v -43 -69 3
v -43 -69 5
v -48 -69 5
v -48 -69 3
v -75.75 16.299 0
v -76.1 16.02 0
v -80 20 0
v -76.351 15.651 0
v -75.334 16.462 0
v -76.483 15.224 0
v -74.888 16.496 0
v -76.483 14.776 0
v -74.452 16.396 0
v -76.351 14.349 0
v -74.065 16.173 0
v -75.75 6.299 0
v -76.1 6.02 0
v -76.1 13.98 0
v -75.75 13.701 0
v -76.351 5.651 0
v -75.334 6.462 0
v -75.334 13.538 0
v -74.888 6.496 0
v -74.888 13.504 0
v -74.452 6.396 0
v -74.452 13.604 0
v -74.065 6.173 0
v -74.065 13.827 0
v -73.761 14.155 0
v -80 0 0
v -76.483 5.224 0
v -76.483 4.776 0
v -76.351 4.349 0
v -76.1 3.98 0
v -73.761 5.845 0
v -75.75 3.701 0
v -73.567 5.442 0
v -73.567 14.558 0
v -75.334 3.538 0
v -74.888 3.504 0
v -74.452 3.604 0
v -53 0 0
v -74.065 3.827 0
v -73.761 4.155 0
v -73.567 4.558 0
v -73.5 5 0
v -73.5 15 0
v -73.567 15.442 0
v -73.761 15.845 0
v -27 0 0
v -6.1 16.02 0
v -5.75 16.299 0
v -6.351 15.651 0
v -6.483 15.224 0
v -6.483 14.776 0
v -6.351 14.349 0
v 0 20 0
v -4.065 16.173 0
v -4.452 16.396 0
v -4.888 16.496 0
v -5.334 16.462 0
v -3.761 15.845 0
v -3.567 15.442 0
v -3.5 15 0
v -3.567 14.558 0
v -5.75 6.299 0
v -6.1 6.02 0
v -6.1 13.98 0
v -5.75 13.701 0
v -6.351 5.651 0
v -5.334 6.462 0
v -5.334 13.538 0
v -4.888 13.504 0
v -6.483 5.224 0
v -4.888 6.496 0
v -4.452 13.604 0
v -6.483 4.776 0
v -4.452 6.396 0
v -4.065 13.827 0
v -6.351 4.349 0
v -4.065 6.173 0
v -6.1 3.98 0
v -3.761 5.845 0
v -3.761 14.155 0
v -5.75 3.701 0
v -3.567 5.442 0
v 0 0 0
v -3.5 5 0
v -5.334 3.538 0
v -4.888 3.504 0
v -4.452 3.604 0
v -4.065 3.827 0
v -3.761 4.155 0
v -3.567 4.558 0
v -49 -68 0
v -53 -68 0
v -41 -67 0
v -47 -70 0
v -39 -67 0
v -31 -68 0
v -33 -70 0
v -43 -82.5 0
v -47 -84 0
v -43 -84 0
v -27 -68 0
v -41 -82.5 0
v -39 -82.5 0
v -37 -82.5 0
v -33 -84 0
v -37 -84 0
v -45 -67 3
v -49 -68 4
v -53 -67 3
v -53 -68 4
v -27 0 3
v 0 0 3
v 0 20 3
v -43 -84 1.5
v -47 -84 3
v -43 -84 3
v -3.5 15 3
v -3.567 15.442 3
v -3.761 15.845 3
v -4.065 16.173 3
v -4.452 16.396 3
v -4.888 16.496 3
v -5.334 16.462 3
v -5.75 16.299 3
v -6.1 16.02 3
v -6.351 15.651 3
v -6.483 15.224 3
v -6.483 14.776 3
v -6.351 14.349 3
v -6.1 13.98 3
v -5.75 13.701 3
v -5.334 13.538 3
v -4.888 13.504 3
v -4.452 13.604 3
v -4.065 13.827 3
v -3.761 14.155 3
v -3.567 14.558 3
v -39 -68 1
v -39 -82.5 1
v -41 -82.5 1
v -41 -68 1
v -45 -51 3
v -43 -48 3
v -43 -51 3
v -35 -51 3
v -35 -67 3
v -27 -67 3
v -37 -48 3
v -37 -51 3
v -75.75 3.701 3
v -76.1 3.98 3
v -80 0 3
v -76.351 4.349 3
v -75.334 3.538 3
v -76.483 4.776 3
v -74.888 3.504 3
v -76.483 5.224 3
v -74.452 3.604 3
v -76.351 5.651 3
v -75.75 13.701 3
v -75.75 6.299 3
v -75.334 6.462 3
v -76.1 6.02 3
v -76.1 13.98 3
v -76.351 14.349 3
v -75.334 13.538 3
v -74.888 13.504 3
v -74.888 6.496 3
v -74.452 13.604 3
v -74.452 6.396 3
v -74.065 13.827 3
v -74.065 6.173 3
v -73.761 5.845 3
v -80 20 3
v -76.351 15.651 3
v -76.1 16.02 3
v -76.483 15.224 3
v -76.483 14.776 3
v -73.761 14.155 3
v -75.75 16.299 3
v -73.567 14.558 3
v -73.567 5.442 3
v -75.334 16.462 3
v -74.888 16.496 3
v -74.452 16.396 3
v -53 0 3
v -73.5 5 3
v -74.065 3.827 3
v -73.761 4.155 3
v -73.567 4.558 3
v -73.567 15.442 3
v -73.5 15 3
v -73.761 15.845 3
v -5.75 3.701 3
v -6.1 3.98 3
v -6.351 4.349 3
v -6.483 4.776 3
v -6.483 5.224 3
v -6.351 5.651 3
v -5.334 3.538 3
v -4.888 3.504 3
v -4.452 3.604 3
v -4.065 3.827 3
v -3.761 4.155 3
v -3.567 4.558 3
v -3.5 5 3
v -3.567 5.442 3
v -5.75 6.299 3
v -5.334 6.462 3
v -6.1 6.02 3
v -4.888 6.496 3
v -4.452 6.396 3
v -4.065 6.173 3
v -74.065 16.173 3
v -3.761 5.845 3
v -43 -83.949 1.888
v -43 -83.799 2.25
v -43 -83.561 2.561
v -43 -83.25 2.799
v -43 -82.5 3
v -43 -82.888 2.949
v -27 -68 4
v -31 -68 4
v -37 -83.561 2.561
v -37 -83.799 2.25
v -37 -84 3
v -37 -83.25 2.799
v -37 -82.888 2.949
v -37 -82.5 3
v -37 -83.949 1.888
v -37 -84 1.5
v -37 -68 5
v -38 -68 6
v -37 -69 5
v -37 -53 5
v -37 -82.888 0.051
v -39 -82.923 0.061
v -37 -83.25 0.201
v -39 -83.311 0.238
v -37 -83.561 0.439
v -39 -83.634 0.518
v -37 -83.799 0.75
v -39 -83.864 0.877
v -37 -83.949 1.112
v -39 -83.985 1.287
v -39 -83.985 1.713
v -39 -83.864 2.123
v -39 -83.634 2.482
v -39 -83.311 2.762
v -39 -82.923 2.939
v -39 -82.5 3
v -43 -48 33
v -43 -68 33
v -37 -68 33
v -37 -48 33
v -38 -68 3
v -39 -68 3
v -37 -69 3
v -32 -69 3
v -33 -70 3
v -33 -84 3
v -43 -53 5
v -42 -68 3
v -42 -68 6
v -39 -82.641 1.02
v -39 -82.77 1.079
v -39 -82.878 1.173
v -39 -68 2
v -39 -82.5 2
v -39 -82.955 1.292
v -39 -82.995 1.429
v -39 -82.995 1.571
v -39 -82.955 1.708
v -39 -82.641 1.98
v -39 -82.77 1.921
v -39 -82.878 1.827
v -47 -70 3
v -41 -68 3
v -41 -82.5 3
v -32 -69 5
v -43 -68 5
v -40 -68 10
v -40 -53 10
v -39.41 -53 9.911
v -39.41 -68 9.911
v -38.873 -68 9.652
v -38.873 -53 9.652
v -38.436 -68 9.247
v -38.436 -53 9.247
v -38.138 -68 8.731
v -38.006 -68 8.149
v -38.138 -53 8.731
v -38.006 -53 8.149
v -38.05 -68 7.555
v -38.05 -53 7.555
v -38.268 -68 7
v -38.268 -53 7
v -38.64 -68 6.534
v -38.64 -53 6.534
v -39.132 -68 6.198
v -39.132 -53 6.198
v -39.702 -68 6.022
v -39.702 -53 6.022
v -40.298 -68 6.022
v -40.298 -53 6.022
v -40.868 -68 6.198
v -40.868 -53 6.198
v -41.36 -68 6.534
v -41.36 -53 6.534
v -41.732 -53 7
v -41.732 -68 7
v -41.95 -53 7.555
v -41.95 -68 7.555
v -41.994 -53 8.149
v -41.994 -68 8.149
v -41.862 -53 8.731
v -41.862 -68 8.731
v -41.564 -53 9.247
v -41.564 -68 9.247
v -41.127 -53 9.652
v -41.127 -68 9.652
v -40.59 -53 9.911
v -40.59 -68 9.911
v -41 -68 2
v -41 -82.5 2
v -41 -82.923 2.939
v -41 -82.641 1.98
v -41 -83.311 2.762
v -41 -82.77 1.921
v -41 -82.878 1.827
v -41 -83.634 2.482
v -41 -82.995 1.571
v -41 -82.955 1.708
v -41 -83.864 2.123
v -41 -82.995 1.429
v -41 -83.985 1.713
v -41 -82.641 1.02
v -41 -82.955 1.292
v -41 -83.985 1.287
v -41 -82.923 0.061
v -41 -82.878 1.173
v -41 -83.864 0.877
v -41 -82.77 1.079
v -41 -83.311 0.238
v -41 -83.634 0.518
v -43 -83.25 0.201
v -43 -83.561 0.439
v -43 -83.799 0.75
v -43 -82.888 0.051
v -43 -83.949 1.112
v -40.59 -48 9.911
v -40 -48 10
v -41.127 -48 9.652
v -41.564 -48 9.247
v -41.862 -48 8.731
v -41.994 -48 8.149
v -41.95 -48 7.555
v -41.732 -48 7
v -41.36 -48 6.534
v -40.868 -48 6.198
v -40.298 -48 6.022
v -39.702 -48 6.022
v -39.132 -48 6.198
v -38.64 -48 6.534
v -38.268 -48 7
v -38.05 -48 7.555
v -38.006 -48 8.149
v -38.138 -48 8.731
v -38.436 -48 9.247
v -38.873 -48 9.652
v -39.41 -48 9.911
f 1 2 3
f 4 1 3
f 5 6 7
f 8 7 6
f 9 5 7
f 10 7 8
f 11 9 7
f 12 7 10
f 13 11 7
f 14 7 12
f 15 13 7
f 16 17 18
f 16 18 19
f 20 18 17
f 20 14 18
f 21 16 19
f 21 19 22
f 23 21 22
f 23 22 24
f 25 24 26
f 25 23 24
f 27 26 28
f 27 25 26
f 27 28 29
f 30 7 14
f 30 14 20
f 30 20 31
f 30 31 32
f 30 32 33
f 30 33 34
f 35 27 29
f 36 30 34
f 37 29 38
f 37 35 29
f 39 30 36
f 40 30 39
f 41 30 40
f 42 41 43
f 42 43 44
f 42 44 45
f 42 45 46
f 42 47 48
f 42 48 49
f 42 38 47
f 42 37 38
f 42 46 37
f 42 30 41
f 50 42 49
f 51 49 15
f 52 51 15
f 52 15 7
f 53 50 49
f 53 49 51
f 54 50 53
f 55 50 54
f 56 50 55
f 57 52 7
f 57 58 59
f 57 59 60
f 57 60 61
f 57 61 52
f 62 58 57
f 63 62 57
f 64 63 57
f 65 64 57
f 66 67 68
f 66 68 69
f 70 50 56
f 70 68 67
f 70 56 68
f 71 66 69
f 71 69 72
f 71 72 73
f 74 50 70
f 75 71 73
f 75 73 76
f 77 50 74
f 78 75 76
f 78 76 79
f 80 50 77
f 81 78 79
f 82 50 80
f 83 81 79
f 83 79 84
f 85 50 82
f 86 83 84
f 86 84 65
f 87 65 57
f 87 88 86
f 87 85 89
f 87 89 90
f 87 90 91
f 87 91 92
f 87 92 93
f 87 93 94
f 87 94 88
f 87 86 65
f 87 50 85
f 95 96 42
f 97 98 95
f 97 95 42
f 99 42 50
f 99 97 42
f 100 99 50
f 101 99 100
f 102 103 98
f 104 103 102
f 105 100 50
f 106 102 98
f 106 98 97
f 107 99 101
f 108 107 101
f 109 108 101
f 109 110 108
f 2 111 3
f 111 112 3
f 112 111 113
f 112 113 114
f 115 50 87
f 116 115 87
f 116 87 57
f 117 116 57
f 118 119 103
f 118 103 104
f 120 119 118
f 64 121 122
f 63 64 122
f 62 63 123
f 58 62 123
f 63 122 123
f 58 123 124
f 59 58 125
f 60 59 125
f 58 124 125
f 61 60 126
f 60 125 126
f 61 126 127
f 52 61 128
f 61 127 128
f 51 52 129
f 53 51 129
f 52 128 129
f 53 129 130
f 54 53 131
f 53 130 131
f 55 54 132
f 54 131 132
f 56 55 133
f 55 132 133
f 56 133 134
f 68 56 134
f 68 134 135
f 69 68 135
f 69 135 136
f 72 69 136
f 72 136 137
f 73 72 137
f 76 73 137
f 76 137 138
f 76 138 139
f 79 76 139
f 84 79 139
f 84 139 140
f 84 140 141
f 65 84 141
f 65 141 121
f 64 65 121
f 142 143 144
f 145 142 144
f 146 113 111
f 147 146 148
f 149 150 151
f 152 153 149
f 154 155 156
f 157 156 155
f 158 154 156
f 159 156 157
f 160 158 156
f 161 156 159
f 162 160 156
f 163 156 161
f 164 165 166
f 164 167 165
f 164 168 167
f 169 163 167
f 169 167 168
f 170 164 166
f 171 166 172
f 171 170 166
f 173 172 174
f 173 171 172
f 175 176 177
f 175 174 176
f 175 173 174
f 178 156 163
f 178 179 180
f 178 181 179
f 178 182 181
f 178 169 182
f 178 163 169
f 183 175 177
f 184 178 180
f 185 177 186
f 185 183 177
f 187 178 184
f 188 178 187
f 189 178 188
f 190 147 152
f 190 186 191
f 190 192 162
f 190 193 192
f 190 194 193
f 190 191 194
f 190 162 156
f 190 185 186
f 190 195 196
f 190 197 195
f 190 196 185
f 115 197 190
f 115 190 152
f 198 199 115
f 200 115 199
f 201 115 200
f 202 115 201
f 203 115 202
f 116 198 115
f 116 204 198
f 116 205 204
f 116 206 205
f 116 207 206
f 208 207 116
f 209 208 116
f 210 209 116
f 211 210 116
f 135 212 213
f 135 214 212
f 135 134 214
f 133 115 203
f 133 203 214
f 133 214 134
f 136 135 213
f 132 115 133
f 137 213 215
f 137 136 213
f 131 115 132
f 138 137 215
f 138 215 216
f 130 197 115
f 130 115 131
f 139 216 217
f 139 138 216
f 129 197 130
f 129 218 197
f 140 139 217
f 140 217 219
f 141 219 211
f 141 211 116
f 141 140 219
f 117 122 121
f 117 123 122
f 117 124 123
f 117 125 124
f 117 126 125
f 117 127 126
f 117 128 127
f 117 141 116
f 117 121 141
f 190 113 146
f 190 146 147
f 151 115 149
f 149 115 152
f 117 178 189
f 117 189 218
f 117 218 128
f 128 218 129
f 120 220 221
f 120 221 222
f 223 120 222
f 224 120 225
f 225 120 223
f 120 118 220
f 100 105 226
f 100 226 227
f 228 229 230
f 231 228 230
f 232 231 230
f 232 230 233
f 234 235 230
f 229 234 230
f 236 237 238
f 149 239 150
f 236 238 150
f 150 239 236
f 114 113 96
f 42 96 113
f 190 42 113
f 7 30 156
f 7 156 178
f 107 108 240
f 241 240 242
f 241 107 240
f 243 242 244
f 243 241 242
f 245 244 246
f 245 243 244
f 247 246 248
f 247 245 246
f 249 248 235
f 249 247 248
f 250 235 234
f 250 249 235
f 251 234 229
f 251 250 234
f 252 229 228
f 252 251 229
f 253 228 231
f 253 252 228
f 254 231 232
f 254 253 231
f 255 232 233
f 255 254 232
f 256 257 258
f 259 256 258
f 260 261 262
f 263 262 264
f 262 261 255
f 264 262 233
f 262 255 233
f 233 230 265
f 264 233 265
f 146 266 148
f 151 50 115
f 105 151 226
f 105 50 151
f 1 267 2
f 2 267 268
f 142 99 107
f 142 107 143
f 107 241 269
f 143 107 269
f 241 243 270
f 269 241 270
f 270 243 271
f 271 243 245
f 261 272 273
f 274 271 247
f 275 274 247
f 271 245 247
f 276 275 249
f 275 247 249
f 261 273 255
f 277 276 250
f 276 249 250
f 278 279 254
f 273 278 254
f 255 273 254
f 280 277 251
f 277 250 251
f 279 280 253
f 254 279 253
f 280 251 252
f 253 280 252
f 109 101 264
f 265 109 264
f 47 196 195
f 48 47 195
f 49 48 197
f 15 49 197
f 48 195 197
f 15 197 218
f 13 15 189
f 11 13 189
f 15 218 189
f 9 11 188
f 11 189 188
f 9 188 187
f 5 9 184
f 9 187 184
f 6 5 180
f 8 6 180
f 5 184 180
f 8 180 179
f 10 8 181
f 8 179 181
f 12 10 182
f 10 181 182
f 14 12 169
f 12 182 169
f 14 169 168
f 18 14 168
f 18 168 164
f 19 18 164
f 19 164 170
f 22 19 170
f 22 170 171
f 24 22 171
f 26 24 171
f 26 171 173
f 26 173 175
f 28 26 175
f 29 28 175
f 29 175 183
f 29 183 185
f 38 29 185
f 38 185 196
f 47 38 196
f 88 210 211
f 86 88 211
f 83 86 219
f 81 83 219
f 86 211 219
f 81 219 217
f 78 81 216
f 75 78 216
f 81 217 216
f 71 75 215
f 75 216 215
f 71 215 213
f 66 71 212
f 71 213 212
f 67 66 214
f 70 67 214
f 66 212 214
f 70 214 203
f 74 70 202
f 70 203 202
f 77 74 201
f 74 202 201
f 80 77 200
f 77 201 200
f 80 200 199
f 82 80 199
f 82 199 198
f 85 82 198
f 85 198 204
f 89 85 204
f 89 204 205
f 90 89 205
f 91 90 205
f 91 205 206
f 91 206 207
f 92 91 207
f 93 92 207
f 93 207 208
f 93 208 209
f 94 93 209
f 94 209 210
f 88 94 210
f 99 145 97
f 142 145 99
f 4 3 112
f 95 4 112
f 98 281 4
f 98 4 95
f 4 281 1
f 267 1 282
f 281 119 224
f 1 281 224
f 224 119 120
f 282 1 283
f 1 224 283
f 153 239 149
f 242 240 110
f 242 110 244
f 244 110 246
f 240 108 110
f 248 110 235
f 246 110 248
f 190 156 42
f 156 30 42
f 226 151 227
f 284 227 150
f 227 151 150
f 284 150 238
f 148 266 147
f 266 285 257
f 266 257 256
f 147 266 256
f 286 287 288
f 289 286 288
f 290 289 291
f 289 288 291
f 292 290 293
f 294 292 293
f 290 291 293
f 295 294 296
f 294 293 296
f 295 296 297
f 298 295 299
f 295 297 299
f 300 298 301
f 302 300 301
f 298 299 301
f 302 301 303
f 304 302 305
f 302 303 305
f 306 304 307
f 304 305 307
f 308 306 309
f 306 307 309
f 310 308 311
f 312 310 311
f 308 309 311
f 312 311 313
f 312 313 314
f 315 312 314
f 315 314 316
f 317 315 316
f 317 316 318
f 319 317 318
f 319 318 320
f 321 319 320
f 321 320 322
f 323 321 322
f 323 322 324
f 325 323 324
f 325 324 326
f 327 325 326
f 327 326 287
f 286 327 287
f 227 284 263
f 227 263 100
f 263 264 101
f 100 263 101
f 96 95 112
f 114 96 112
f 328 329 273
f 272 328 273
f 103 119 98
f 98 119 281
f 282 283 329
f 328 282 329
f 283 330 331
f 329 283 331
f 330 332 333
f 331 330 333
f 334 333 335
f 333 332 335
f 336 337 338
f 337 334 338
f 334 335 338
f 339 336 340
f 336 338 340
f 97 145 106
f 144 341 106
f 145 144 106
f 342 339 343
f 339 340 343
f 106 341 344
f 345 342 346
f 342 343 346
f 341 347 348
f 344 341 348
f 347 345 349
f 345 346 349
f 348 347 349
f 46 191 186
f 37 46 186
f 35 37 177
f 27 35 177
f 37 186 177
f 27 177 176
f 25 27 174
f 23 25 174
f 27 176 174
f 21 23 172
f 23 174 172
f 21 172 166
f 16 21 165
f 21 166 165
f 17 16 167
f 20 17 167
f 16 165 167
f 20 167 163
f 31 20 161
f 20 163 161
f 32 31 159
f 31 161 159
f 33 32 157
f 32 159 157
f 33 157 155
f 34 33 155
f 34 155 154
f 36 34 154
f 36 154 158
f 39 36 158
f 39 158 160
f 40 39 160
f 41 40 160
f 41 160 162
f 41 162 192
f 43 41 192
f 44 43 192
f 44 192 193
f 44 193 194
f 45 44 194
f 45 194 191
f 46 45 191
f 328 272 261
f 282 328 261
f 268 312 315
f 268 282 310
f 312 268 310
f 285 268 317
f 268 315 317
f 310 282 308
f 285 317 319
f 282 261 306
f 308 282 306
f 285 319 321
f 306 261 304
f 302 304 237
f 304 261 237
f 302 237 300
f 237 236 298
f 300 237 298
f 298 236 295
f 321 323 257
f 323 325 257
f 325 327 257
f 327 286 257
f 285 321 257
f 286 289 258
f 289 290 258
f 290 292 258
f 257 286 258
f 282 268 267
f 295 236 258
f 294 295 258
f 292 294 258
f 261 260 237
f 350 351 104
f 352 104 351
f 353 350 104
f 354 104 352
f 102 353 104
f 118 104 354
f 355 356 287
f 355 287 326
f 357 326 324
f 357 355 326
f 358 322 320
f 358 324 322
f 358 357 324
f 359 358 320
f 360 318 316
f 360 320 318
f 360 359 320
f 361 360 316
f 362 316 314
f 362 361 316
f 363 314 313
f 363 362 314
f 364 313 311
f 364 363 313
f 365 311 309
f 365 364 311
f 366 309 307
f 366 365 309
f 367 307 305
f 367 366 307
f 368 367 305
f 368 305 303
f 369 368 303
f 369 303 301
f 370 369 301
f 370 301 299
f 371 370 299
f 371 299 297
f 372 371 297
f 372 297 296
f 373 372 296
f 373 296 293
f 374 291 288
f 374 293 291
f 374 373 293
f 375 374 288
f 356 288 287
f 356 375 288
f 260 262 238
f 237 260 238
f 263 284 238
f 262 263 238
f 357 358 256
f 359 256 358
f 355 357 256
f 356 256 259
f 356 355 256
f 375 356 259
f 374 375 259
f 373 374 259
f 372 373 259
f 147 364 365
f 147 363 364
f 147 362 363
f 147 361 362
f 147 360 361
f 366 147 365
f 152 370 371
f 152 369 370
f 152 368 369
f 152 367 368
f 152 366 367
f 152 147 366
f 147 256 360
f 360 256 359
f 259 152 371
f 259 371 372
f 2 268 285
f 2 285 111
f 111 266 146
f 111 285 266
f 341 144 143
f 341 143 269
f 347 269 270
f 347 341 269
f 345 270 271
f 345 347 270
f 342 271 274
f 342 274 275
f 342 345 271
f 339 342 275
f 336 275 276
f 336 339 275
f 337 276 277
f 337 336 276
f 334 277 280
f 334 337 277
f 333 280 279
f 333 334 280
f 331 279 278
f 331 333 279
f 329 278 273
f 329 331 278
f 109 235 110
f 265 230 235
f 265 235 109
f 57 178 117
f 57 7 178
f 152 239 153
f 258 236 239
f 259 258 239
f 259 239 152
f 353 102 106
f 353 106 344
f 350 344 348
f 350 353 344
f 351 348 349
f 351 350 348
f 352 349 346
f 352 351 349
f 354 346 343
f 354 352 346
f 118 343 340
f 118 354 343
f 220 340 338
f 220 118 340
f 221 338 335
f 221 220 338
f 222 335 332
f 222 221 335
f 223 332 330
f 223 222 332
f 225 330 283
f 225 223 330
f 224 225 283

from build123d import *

# Parameters (mm, degrees)
SKETCH_1_W           = 80
SKETCH_1_H           = 20
EXTRUDE_1_DEPTH      = 3
SKETCH_2_W           = 6
SKETCH_2_H           = 20
EXTRUDE_2_DEPTH      = 95
SKETCH_3_W           = 6
SKETCH_3_H           = 15
EXTRUDE_3_DEPTH      = 80
CHAMFER_1_SIZE       = 10
CHAMFER_2_SIZE       = 10
FILLET_1_R           = 10
SKETCH_4_W           = 6
SKETCH_4_H           = 15
EXTRUDE_4_DEPTH      = 5
SKETCH_5_W           = 6
SKETCH_5_H           = 15
EXTRUDE_5_DEPTH      = 5
FILLET_2_R           = 2
CHAMFER_3_SIZE       = 3
SKETCH_6_R           = 1.5
CUT_EXTRUDE_1_DEPTH  = 30
SKETCH_7_W           = 26
SKETCH_7_H           = 3
EXTRUDE_6_DEPTH      = 68
CHAMFER_4_SIZE       = 10
SKETCH_8_W           = 6
SKETCH_8_H           = 13
EXTRUDE_7_DEPTH      = 100
CHAMFER_5_SIZE       = 5
CHAMFER_6_SIZE       = 2
SKETCH_9_W           = 99.532664039
SKETCH_9_H           = 104.077347625
CUT_EXTRUDE_3_DEPTH  = 30
SKETCH_14_W          = 15.593287018
SKETCH_14_H          = 53.78968733
CUT_EXTRUDE_5_DEPTH  = 57
SKETCH_15_W          = 6
SKETCH_15_H          = 25
EXTRUDE_8_DEPTH      = 5
SKETCH_16_W          = 6
SKETCH_16_H          = 25
EXTRUDE_9_DEPTH      = 5
CHAMFER_7_SIZE       = 5
SKETCH_17_W          = 6
SKETCH_17_H          = 23
CUT_EXTRUDE_6_DEPTH  = 100
SKETCH_20_W          = 26.699145715
SKETCH_20_H          = 4.006007242
CUT_EXTRUDE_7_DEPTH  = 133
SKETCH_21_W          = 6
SKETCH_21_H          = 15
EXTRUDE_11_DEPTH     = 30
SKETCH_22_R          = 2
CUT_EXTRUDE_8_DEPTH  = 27
EXTRUDE_12_DEPTH     = 3
SKETCH_26_W          = 4
SKETCH_26_H          = 3
EXTRUDE_14_DEPTH     = 16
SKETCH_27_W          = 4
SKETCH_27_H          = 13
EXTRUDE_21_DEPTH     = 6
SKETCH_28_R          = 1.5
CUT_EXTRUDE_9_DEPTH  = 22
CHAMFER_9_SIZE       = 2
CHAMFER_10_SIZE      = 2
CHAMFER_11_SIZE      = 1
SKETCH_29_W          = 6
SKETCH_29_H          = 28
EXTRUDE_22_DEPTH     = 20
SKETCH_30_W          = 6
SKETCH_30_H          = 20
EXTRUDE_23_DEPTH     = 2
CUT_EXTRUDE_START    = -20
SKETCH_31_R          = 2
CUT_EXTRUDE_10_DEPTH = 20
SKETCH_32_R          = 1.5
CUT_EXTRUDE_11_DEPTH = 10
SKETCH_33_W          = 6
SKETCH_33_H          = 30
CUT_EXTRUDE_12_DEPTH = 15
CUT_EXTRUDE_13_DEPTH = 6
EXTRUDE_24_DEPTH     = 2
EXTRUDE_25_REACH     = 136.146
SKETCH_37_W          = 2
SKETCH_37_H          = 3
EXTRUDE_26_DEPTH     = 2
EXTRUDE_27_DEPTH     = 2
EXTRUDE_28_REACH     = 136.146
CHAMFER_12_SIZE      = 1


# Some blends are built 0.0001 mm under size
with BuildPart() as part:
    # 草图1 → 凸台-拉伸1 (new body)
    with BuildSketch(Plane.XY):
        with Locations((-40, 10)):
            Rectangle(SKETCH_1_W, SKETCH_1_H)
    extrude(amount=EXTRUDE_1_DEPTH)

    # 草图2 → 凸台-拉伸2 (add)
    with BuildSketch(Plane.XY.offset(3)):
        with Locations((-40, 10)):
            Rectangle(SKETCH_2_W, SKETCH_2_H)
    extrude(amount=EXTRUDE_2_DEPTH)

    # 草图3 → 凸台-拉伸3 (add)
    with BuildSketch(Plane.XZ):
        with Locations((-40, 90.5)):
            Rectangle(SKETCH_3_W, SKETCH_3_H)
    extrude(amount=EXTRUDE_3_DEPTH)

    # 倒角1
    chamfer_1_edges = [part.edges().sort_by_distance(p)[0] for p in [
        (-43, 10, 3),
        (-37, 10, 3),
    ]]
    chamfer(chamfer_1_edges, length=CHAMFER_1_SIZE)

    # 倒角2
    chamfer_2_edges = [part.edges().sort_by_distance(p)[0] for p in [
        (-40, 0, 83),
    ]]
    chamfer(chamfer_2_edges, length=CHAMFER_2_SIZE)

    # 圆角1
    fillet_1_edges = [part.edges().sort_by_distance(p)[0] for p in [
        (-40, 20, 98),
    ]]
    fillet(fillet_1_edges, radius=FILLET_1_R)

    # 草图4 → 凸台-拉伸4 (add)
    with BuildSketch(Plane(origin=(0, 0, 83), x_dir=(-1, 0, 0), z_dir=(0, 0, -1))):
        with Locations((40, -72.5)):
            Rectangle(SKETCH_4_W, SKETCH_4_H)
    extrude(amount=EXTRUDE_4_DEPTH)

    # 草图5 → 凸台-拉伸5 (add)
    with BuildSketch(Plane.XY.offset(98)):
        with Locations((-40, -72.5)):
            Rectangle(SKETCH_5_W, SKETCH_5_H)
    extrude(amount=EXTRUDE_5_DEPTH)

    # 圆角2
    fillet_2_edges = [part.edges().sort_by_distance(p)[0] for p in [
        (-40, -65, 78),
        (-40, -65, 103),
    ]]
    fillet(fillet_2_edges, radius=FILLET_2_R)

    # 倒角3
    chamfer_3_edges = [part.edges().sort_by_distance(p)[0] for p in [
        (-40, -65, 83),
        (-40, -65, 98),
    ]]
    chamfer(chamfer_3_edges, length=CHAMFER_3_SIZE - 0.0001)  # a hair under: the kernel refuses the full size

    # 草图6 → 切除-拉伸1 (cut)
    with BuildSketch(Plane.XZ):
        with Locations(Location((-40, 8, 0), (0, 0, 270))):
            Circle(SKETCH_6_R)
        with Locations(Location((-40, 23, 0), (0, 0, 270))):
            Circle(SKETCH_6_R)
    extrude(amount=-CUT_EXTRUDE_1_DEPTH, mode=Mode.SUBTRACT)

    # 草图7 → 凸台-拉伸6 (add)
    with BuildSketch(Plane.XZ):
        with Locations((-40, 1.5)):
            Rectangle(SKETCH_7_W, SKETCH_7_H)
    extrude(amount=EXTRUDE_6_DEPTH)

    # 倒角4
    chamfer_4_edges = [part.edges().sort_by_distance(p)[0] for p in [
        (-53, -68, 1.5),
        (-27, -68, 1.5),
    ]]
    chamfer(chamfer_4_edges, length=CHAMFER_4_SIZE)

    # 草图8 → 凸台-拉伸7 (add)
    with BuildSketch(Plane.XY.offset(3)):
        with Locations((-40, -73.5)):
            Rectangle(SKETCH_8_W, SKETCH_8_H)
    extrude(amount=EXTRUDE_7_DEPTH)

    # 倒角5
    chamfer_5_edges = [part.edges().sort_by_distance(p)[0] for p in [
        (-40, -67, 3),
    ]]
    chamfer(chamfer_5_edges, length=CHAMFER_5_SIZE)

    # 倒角6
    # the kernel refuses this chamfer: 2 mm, written as the material it adds along each edge
    with BuildSketch(Plane(origin=(-37, -56.856634024, 3), x_dir=(1, 0, 0), z_dir=(0, -1, 0))) as chamfer_6_piece_1_section:
        Polygon((CHAMFER_6_SIZE, 0), (0, CHAMFER_6_SIZE), (0, 0), align=None)
    chamfer_6_piece_1 = extrude(amount=16.286731952, mode=Mode.PRIVATE)
    chamfer_6_piece_1 = split(chamfer_6_piece_1, bisect_by=Plane(origin=(-37, -59.428317012, 0.428317012), z_dir=(0, -0.7071067811865476, -0.7071067811865476)), keep=Keep.TOP, mode=Mode.PRIVATE)
    chamfer_6_piece_1 = split(chamfer_6_piece_1, bisect_by=Plane(origin=(-31.428317012, -62.428317012, 3), z_dir=(-0.7071067811865475, 0.7071067811865477, -1.922962686383564e-15)), keep=Keep.TOP, mode=Mode.PRIVATE)
    add(chamfer_6_piece_1)
    with BuildSketch(Plane(origin=(-43, -73.143365976, 3), x_dir=(-1, 0, 0), z_dir=(0, 1, 0))) as chamfer_6_piece_2_section:
        Polygon((CHAMFER_6_SIZE, 0), (0, CHAMFER_6_SIZE), (0, 0), align=None)
    chamfer_6_piece_2 = extrude(amount=16.286731952, mode=Mode.PRIVATE)
    chamfer_6_piece_2 = split(chamfer_6_piece_2, bisect_by=Plane(origin=(-43, -67.571682988, 8.571682988), z_dir=(0, -0.7071067811865476, -0.7071067811865476)), keep=Keep.TOP, mode=Mode.PRIVATE)
    chamfer_6_piece_2 = split(chamfer_6_piece_2, bisect_by=Plane(origin=(-40.428317012, -70.571682988, 3), z_dir=(0.7071067811865476, 0.7071067811865476, 3.5574809698095944e-15)), keep=Keep.TOP, mode=Mode.PRIVATE)
    add(chamfer_6_piece_2)

    # 草图9 → 切除-拉伸3 (cut)
    with BuildSketch(Plane(origin=(0, 20, 0), x_dir=(1, 0, 0), z_dir=(0, 1, 0))):
        with Locations((-30.233667981, -55.038673813)):
            Rectangle(SKETCH_9_W, SKETCH_9_H)
    extrude(amount=-CUT_EXTRUDE_3_DEPTH, mode=Mode.SUBTRACT)

    # 草图14 → 切除-拉伸5 (cut)
    with BuildSketch(Plane(origin=(0, -10, 0), x_dir=(1, 0, 0), z_dir=(0, 1, 0))):
        with Locations((-38.927067407, -81.040006974)):
            Rectangle(SKETCH_14_W, SKETCH_14_H)
    extrude(amount=-CUT_EXTRUDE_5_DEPTH, mode=Mode.SUBTRACT)

    # 草图15 → 凸台-拉伸8 (add)
    with BuildSketch(Plane(origin=(0, -67, 0), x_dir=(1, 0, 0), z_dir=(0, 1, 0))):
        with Locations((-40, -90.5)):
            Rectangle(SKETCH_15_W, SKETCH_15_H)
    extrude(amount=EXTRUDE_8_DEPTH)

    # 草图16 → 凸台-拉伸9 (add)
    with BuildSketch(Plane.XZ.offset(80)):
        with Locations((-40, 90.5)):
            Rectangle(SKETCH_16_W, SKETCH_16_H)
    extrude(amount=EXTRUDE_9_DEPTH)

    # 倒角7
    chamfer_7_edges = [part.edges().sort_by_distance(p)[0] for p in [
        (-40, -80, 78),
        (-40, -67, 78),
    ]]
    chamfer(chamfer_7_edges, length=CHAMFER_7_SIZE - 0.0001)  # a hair under: the kernel refuses the full size

    # 草图17 → 切除-拉伸6 (cut)
    with BuildSketch(Plane.XY.offset(103)):
        with Locations((-40, -73.5)):
            Rectangle(SKETCH_17_W, SKETCH_17_H)
    extrude(amount=-CUT_EXTRUDE_6_DEPTH, mode=Mode.SUBTRACT)

    # 草图20 → 切除-拉伸7 (cut)
    with BuildSketch(Plane(origin=(0, 20, 0), x_dir=(1, 0, 0), z_dir=(0, 1, 0))):
        with Locations((-37.936501357, -5.003003621)):
            Rectangle(SKETCH_20_W, SKETCH_20_H)
    extrude(amount=-CUT_EXTRUDE_7_DEPTH, mode=Mode.SUBTRACT)

    # 草图21 → 凸台-拉伸11 (add)
    with BuildSketch(Plane.XY.offset(3)):
        with Locations((-40, -60.5)):
            Rectangle(SKETCH_21_W, SKETCH_21_H)
    extrude(amount=EXTRUDE_11_DEPTH)

    # 草图22 → 切除-拉伸8 (cut)
    with BuildSketch(Plane(origin=(0, -53, 0), x_dir=(1, 0, 0), z_dir=(0, 1, 0))):
        with Locations(Location((-40, -8, 0), (0, 0, 270))):
            Circle(SKETCH_22_R)
    extrude(amount=-CUT_EXTRUDE_8_DEPTH, mode=Mode.SUBTRACT)

    # 草图24 → 凸台-拉伸12 (add)
    with BuildSketch(Plane(origin=(0, 0, 0), x_dir=(-1, 0, 0), z_dir=(0, 0, -1))):
        Polygon((27, -58), (27, -68), (37, -68), align=None)
        Polygon((53, -58), (53, -68), (43, -68), align=None)
    extrude(amount=-EXTRUDE_12_DEPTH)

    # 草图26 → 凸台-拉伸14 (add)
    with BuildSketch(Plane.XZ.offset(68)):
        with Locations((-45, 1.5)):
            Rectangle(SKETCH_26_W, SKETCH_26_H)
        with Locations((-35, 1.5)):
            Rectangle(SKETCH_26_W, SKETCH_26_H)
    extrude(amount=EXTRUDE_14_DEPTH)

    # 草图27 → 凸台-拉伸21 (add)
    with BuildSketch(Plane.XY.offset(3)):
        with Locations((-45, -75.5)):
            Rectangle(SKETCH_27_W, SKETCH_27_H)
        with Locations((-35, -75.5)):
            Rectangle(SKETCH_27_W, SKETCH_27_H)
    extrude(amount=EXTRUDE_21_DEPTH)

    # 草图28 → 切除-拉伸9 (cut)
    with BuildSketch(Plane(origin=(-33, 0, 0), x_dir=(0, 0, -1), z_dir=(1, 0, 0))):
        with Locations((-6, -75.5)):
            Circle(SKETCH_28_R)
    extrude(amount=-CUT_EXTRUDE_9_DEPTH, mode=Mode.SUBTRACT)

    # 倒角8
    # the kernel refuses this chamfer: 2 mm, written as the material it adds along each edge
    with BuildSketch(Plane(origin=(-53.152771873, -69, 3), x_dir=(0, 1, 0), z_dir=(1, 0, 0))) as chamfer_8_piece_1_section:
        with BuildLine():
            Line((2.424264069, -0.424264069), (-0.424264069, 2.424264069))
            Line((-0.424264069, 2.424264069), (-0.724264069, 2.424264069))
            ThreePointArc((-0.724264069, 2.424264069), (-0.3, 1.212132034), (-0.3, 0))
            Line((-0.3, 0), (0, -0.3))
            ThreePointArc((0, -0.3), (1.212132034, -0.3), (2.424264069, -0.724264069))
            Line((2.424264069, -0.724264069), (2.424264069, -0.424264069))
        make_face()
    chamfer_8_piece_1 = extrude(amount=10.152771873, mode=Mode.PRIVATE)
    chamfer_8_piece_1 = split(chamfer_8_piece_1, bisect_by=Plane(origin=(-47, -69, 3), z_dir=(-1, 0, 0)), keep=Keep.TOP, mode=Mode.PRIVATE)
    chamfer_8_piece_1 = split(chamfer_8_piece_1, bisect_by=Plane(origin=(-53.152771873, -68, 3), z_dir=(0, 1, 0)), keep=Keep.TOP, mode=Mode.PRIVATE)
    chamfer_8_piece_1 = split(chamfer_8_piece_1, bisect_by=Plane(origin=(-53, -69, 3), z_dir=(1, 0, 0)), keep=Keep.TOP, mode=Mode.PRIVATE)
    add(chamfer_8_piece_1)
    with BuildSketch(Plane(origin=(-47, -69, 3), x_dir=(0, 1, 0), z_dir=(1, 0, 0))) as chamfer_8_piece_2_section:
        with BuildLine():
            Line((2.424264069, -0.424264069), (-0.424264069, 2.424264069))
            Line((-0.424264069, 2.424264069), (-0.724264069, 2.424264069))
            ThreePointArc((-0.724264069, 2.424264069), (-0.3, 1.212132034), (-0.3, 0))
            Line((-0.3, 0), (0, -0.3))
            ThreePointArc((0, -0.3), (1.212132034, -0.3), (2.424264069, -0.724264069))
            Line((2.424264069, -0.724264069), (2.424264069, -0.424264069))
        make_face()
    chamfer_8_piece_2 = extrude(amount=4, mode=Mode.PRIVATE)
    chamfer_8_piece_2 = split(chamfer_8_piece_2, bisect_by=Plane(origin=(-47, -68, 3), z_dir=(0, 1, 0)), keep=Keep.TOP, mode=Mode.PRIVATE)
    add(chamfer_8_piece_2)
    with BuildSketch(Plane(origin=(-47, -69, 3), x_dir=(0, 1, 0), z_dir=(1, 0, 0))) as chamfer_8_piece_3_section:
        with BuildLine():
            Line((2.424264069, -0.424264069), (-0.424264069, 2.424264069))
            Line((-0.424264069, 2.424264069), (-0.724264069, 2.424264069))
            ThreePointArc((-0.724264069, 2.424264069), (-0.3, 1.212132034), (-0.3, 0))
            Line((-0.3, 0), (0, -0.3))
            ThreePointArc((0, -0.3), (1.212132034, -0.3), (2.424264069, -0.724264069))
            Line((2.424264069, -0.724264069), (2.424264069, -0.424264069))
        make_face()
    chamfer_8_piece_3 = extrude(amount=4, mode=Mode.PRIVATE)
    chamfer_8_piece_3 = split(chamfer_8_piece_3, bisect_by=Plane(origin=(-47, -68, 3), z_dir=(0, -1, 0)), keep=Keep.TOP, mode=Mode.PRIVATE)
    add(chamfer_8_piece_3)
    with BuildSketch(Plane(origin=(-47, -69, 3), x_dir=(0, 1, 0), z_dir=(1, 0, 0))) as chamfer_8_piece_4_section:
        with BuildLine():
            Line((2.424264069, -0.424264069), (-0.424264069, 2.424264069))
            Line((-0.424264069, 2.424264069), (-0.724264069, 2.424264069))
            ThreePointArc((-0.724264069, 2.424264069), (-0.3, 1.212132034), (-0.3, 0))
            Line((-0.3, 0), (0, -0.3))
            ThreePointArc((0, -0.3), (1.212132034, -0.3), (2.424264069, -0.724264069))
            Line((2.424264069, -0.724264069), (2.424264069, -0.424264069))
        make_face()
    chamfer_8_piece_4 = extrude(amount=10.152771873, mode=Mode.PRIVATE)
    chamfer_8_piece_4 = split(chamfer_8_piece_4, bisect_by=Plane(origin=(-37, -69, 3), z_dir=(-1, 0, 0)), keep=Keep.TOP, mode=Mode.PRIVATE)
    chamfer_8_piece_4 = split(chamfer_8_piece_4, bisect_by=Plane(origin=(-43, -69, 3), z_dir=(1, 0, 0)), keep=Keep.TOP, mode=Mode.PRIVATE)
    chamfer_8_piece_4 = split(chamfer_8_piece_4, bisect_by=Plane(origin=(-47, -68, 3), z_dir=(0, 1, 0)), keep=Keep.TOP, mode=Mode.PRIVATE)
    add(chamfer_8_piece_4)
    with BuildSketch(Plane(origin=(-47, -69, 3), x_dir=(0, 1, 0), z_dir=(1, 0, 0))) as chamfer_8_piece_5_section:
        with BuildLine():
            Line((2.424264069, -0.424264069), (-0.424264069, 2.424264069))
            Line((-0.424264069, 2.424264069), (-0.724264069, 2.424264069))
            ThreePointArc((-0.724264069, 2.424264069), (-0.3, 1.212132034), (-0.3, 0))
            Line((-0.3, 0), (0, -0.3))
            ThreePointArc((0, -0.3), (1.212132034, -0.3), (2.424264069, -0.724264069))
            Line((2.424264069, -0.724264069), (2.424264069, -0.424264069))
        make_face()
    chamfer_8_piece_5 = extrude(amount=10.152771873, mode=Mode.PRIVATE)
    chamfer_8_piece_5 = split(chamfer_8_piece_5, bisect_by=Plane(origin=(-37, -69, 3), z_dir=(1, 0, 0)), keep=Keep.TOP, mode=Mode.PRIVATE)
    chamfer_8_piece_5 = split(chamfer_8_piece_5, bisect_by=Plane(origin=(-47, -68, 3), z_dir=(0, 1, 0)), keep=Keep.TOP, mode=Mode.PRIVATE)
    add(chamfer_8_piece_5)
    with BuildSketch(Plane(origin=(-47, -69, 3), x_dir=(0, 1, 0), z_dir=(1, 0, 0))) as chamfer_8_piece_6_section:
        with BuildLine():
            Line((2.424264069, -0.424264069), (-0.424264069, 2.424264069))
            Line((-0.424264069, 2.424264069), (-0.724264069, 2.424264069))
            ThreePointArc((-0.724264069, 2.424264069), (-0.3, 1.212132034), (-0.3, 0))
            Line((-0.3, 0), (0, -0.3))
            ThreePointArc((0, -0.3), (1.212132034, -0.3), (2.424264069, -0.724264069))
            Line((2.424264069, -0.724264069), (2.424264069, -0.424264069))
        make_face()
    chamfer_8_piece_6 = extrude(amount=10.152771873, mode=Mode.PRIVATE)
    chamfer_8_piece_6 = split(chamfer_8_piece_6, bisect_by=Plane(origin=(-37, -69, 3), z_dir=(1, 0, 0)), keep=Keep.TOP, mode=Mode.PRIVATE)
    chamfer_8_piece_6 = split(chamfer_8_piece_6, bisect_by=Plane(origin=(-47, -68, 3), z_dir=(0, -1, 0)), keep=Keep.TOP, mode=Mode.PRIVATE)
    add(chamfer_8_piece_6)
    with BuildSketch(Plane(origin=(-43.152771873, -69, 3), x_dir=(0, 1, 0), z_dir=(1, 0, 0))) as chamfer_8_piece_7_section:
        with BuildLine():
            Line((2.424264069, -0.424264069), (-0.424264069, 2.424264069))
            Line((-0.424264069, 2.424264069), (-0.724264069, 2.424264069))
            ThreePointArc((-0.724264069, 2.424264069), (-0.3, 1.212132034), (-0.3, 0))
            Line((-0.3, 0), (0, -0.3))
            ThreePointArc((0, -0.3), (1.212132034, -0.3), (2.424264069, -0.724264069))
            Line((2.424264069, -0.724264069), (2.424264069, -0.424264069))
        make_face()
    chamfer_8_piece_7 = extrude(amount=10.152771873, mode=Mode.PRIVATE)
    chamfer_8_piece_7 = split(chamfer_8_piece_7, bisect_by=Plane(origin=(-43.152771873, -68, 3), z_dir=(0, 1, 0)), keep=Keep.TOP, mode=Mode.PRIVATE)
    chamfer_8_piece_7 = split(chamfer_8_piece_7, bisect_by=Plane(origin=(-43, -69, 3), z_dir=(-1, 0, 0)), keep=Keep.TOP, mode=Mode.PRIVATE)
    add(chamfer_8_piece_7)
    with BuildSketch(Plane(origin=(-43.152771873, -69, 3), x_dir=(0, 1, 0), z_dir=(1, 0, 0))) as chamfer_8_piece_8_section:
        with BuildLine():
            Line((2.424264069, -0.424264069), (-0.424264069, 2.424264069))
            Line((-0.424264069, 2.424264069), (-0.724264069, 2.424264069))
            ThreePointArc((-0.724264069, 2.424264069), (-0.3, 1.212132034), (-0.3, 0))
            Line((-0.3, 0), (0, -0.3))
            ThreePointArc((0, -0.3), (1.212132034, -0.3), (2.424264069, -0.724264069))
            Line((2.424264069, -0.724264069), (2.424264069, -0.424264069))
        make_face()
    chamfer_8_piece_8 = extrude(amount=10.152771873, mode=Mode.PRIVATE)
    chamfer_8_piece_8 = split(chamfer_8_piece_8, bisect_by=Plane(origin=(-43.152771873, -68, 3), z_dir=(0, -1, 0)), keep=Keep.TOP, mode=Mode.PRIVATE)
    chamfer_8_piece_8 = split(chamfer_8_piece_8, bisect_by=Plane(origin=(-43, -69, 3), z_dir=(-1, 0, 0)), keep=Keep.TOP, mode=Mode.PRIVATE)
    add(chamfer_8_piece_8)
    with BuildSketch(Plane(origin=(-43.152771873, -69, 3), x_dir=(0, 1, 0), z_dir=(1, 0, 0))) as chamfer_8_piece_9_section:
        with BuildLine():
            Line((2.424264069, -0.424264069), (-0.424264069, 2.424264069))
            Line((-0.424264069, 2.424264069), (-0.724264069, 2.424264069))
            ThreePointArc((-0.724264069, 2.424264069), (-0.3, 1.212132034), (-0.3, 0))
            Line((-0.3, 0), (0, -0.3))
            ThreePointArc((0, -0.3), (1.212132034, -0.3), (2.424264069, -0.724264069))
            Line((2.424264069, -0.724264069), (2.424264069, -0.424264069))
        make_face()
    chamfer_8_piece_9 = extrude(amount=10.152771873, mode=Mode.PRIVATE)
    chamfer_8_piece_9 = split(chamfer_8_piece_9, bisect_by=Plane(origin=(-43.152771873, -68, 3), z_dir=(0, 1, 0)), keep=Keep.TOP, mode=Mode.PRIVATE)
    chamfer_8_piece_9 = split(chamfer_8_piece_9, bisect_by=Plane(origin=(-37, -69, 3), z_dir=(-1, 0, 0)), keep=Keep.TOP, mode=Mode.PRIVATE)
    chamfer_8_piece_9 = split(chamfer_8_piece_9, bisect_by=Plane(origin=(-43, -69, 3), z_dir=(1, 0, 0)), keep=Keep.TOP, mode=Mode.PRIVATE)
    add(chamfer_8_piece_9)
    with BuildSketch(Plane(origin=(-37, -69, 3), x_dir=(0, 1, 0), z_dir=(1, 0, 0))) as chamfer_8_piece_10_section:
        with BuildLine():
            Line((2.424264069, -0.424264069), (-0.424264069, 2.424264069))
            Line((-0.424264069, 2.424264069), (-0.724264069, 2.424264069))
            ThreePointArc((-0.724264069, 2.424264069), (-0.3, 1.212132034), (-0.3, 0))
            Line((-0.3, 0), (0, -0.3))
            ThreePointArc((0, -0.3), (1.212132034, -0.3), (2.424264069, -0.724264069))
            Line((2.424264069, -0.724264069), (2.424264069, -0.424264069))
        make_face()
    chamfer_8_piece_10 = extrude(amount=4, mode=Mode.PRIVATE)
    chamfer_8_piece_10 = split(chamfer_8_piece_10, bisect_by=Plane(origin=(-37, -68, 3), z_dir=(0, 1, 0)), keep=Keep.TOP, mode=Mode.PRIVATE)
    add(chamfer_8_piece_10)
    with BuildSketch(Plane(origin=(-37, -69, 3), x_dir=(0, 1, 0), z_dir=(1, 0, 0))) as chamfer_8_piece_11_section:
        with BuildLine():
            Line((2.424264069, -0.424264069), (-0.424264069, 2.424264069))
            Line((-0.424264069, 2.424264069), (-0.724264069, 2.424264069))
            ThreePointArc((-0.724264069, 2.424264069), (-0.3, 1.212132034), (-0.3, 0))
            Line((-0.3, 0), (0, -0.3))
            ThreePointArc((0, -0.3), (1.212132034, -0.3), (2.424264069, -0.724264069))
            Line((2.424264069, -0.724264069), (2.424264069, -0.424264069))
        make_face()
    chamfer_8_piece_11 = extrude(amount=4, mode=Mode.PRIVATE)
    chamfer_8_piece_11 = split(chamfer_8_piece_11, bisect_by=Plane(origin=(-37, -68, 3), z_dir=(0, -1, 0)), keep=Keep.TOP, mode=Mode.PRIVATE)
    add(chamfer_8_piece_11)
    with BuildSketch(Plane(origin=(-37, -69, 3), x_dir=(0, 1, 0), z_dir=(1, 0, 0))) as chamfer_8_piece_12_section:
        with BuildLine():
            Line((2.424264069, -0.424264069), (-0.424264069, 2.424264069))
            Line((-0.424264069, 2.424264069), (-0.724264069, 2.424264069))
            ThreePointArc((-0.724264069, 2.424264069), (-0.3, 1.212132034), (-0.3, 0))
            Line((-0.3, 0), (0, -0.3))
            ThreePointArc((0, -0.3), (1.212132034, -0.3), (2.424264069, -0.724264069))
            Line((2.424264069, -0.724264069), (2.424264069, -0.424264069))
        make_face()
    chamfer_8_piece_12 = extrude(amount=10.152771873, mode=Mode.PRIVATE)
    chamfer_8_piece_12 = split(chamfer_8_piece_12, bisect_by=Plane(origin=(-27, -69, 3), z_dir=(-1, 0, 0)), keep=Keep.TOP, mode=Mode.PRIVATE)
    chamfer_8_piece_12 = split(chamfer_8_piece_12, bisect_by=Plane(origin=(-37, -68, 3), z_dir=(0, 1, 0)), keep=Keep.TOP, mode=Mode.PRIVATE)
    chamfer_8_piece_12 = split(chamfer_8_piece_12, bisect_by=Plane(origin=(-33, -69, 3), z_dir=(1, 0, 0)), keep=Keep.TOP, mode=Mode.PRIVATE)
    add(chamfer_8_piece_12)

    # 倒角9
    # the kernel refuses this chamfer: 2 mm, written as the material it adds along each edge
    with BuildSketch(Plane(origin=(-43, -53, 3), x_dir=(0, 0, 1), z_dir=(0, -1, 0)), Plane(origin=(-37, -72.143365976, 3), x_dir=(0, 0, 1), z_dir=(0, 1, 0))) as chamfer_9_piece_1:
        Polygon((CHAMFER_9_SIZE, 0), (0, CHAMFER_9_SIZE), (0, 0), align=None)
    extrude(amount=19.143365976)
    with BuildSketch(Plane(origin=(-37, -53, 3), x_dir=(0, 0, 1), z_dir=(-1, 0, 0))) as chamfer_9_piece_2:
        Polygon((CHAMFER_9_SIZE, 0), (0, CHAMFER_9_SIZE), (0, 0), align=None)
    extrude(amount=6)
    with BuildSketch(Plane(origin=(-37, -53, 3), x_dir=(0, 0, 1), z_dir=(-1, 0, 0))) as chamfer_9_piece_3a_section:
        Polygon((CHAMFER_9_SIZE, 0), (0, CHAMFER_9_SIZE), (0, 0), align=None)
    chamfer_9_piece_3a = extrude(amount=11.143365976, mode=Mode.PRIVATE)
    chamfer_9_piece_3a = split(chamfer_9_piece_3a, bisect_by=Plane(origin=(-43, -53, 3), z_dir=(-1, 0, 0)), keep=Keep.TOP, mode=Mode.PRIVATE)
    with BuildSketch(Plane(origin=(-43, -47.856634024, 3), x_dir=(0, 0, 1), z_dir=(0, -1, 0))) as chamfer_9_piece_3b_section:
        Polygon((CHAMFER_9_SIZE, 0), (0, CHAMFER_9_SIZE), (0, 0), align=None)
    chamfer_9_piece_3b = extrude(amount=24.286731952, mode=Mode.PRIVATE)
    chamfer_9_piece_3b = split(chamfer_9_piece_3b, bisect_by=Plane(origin=(-43, -53, 3), z_dir=(0, 1, 0)), keep=Keep.TOP, mode=Mode.PRIVATE)
    chamfer_9_piece_3 = chamfer_9_piece_3a & chamfer_9_piece_3b
    add(chamfer_9_piece_3)
    with BuildSketch(Plane(origin=(-31.856634024, -53, 3), x_dir=(0, 0, 1), z_dir=(-1, 0, 0))) as chamfer_9_piece_4a_section:
        Polygon((CHAMFER_9_SIZE, 0), (0, CHAMFER_9_SIZE), (0, 0), align=None)
    chamfer_9_piece_4a = extrude(amount=11.143365976, mode=Mode.PRIVATE)
    chamfer_9_piece_4a = split(chamfer_9_piece_4a, bisect_by=Plane(origin=(-37, -53, 3), z_dir=(1, 0, 0)), keep=Keep.TOP, mode=Mode.PRIVATE)
    with BuildSketch(Plane(origin=(-37, -72.143365976, 3), x_dir=(0, 0, 1), z_dir=(0, 1, 0))) as chamfer_9_piece_4b_section:
        Polygon((CHAMFER_9_SIZE, 0), (0, CHAMFER_9_SIZE), (0, 0), align=None)
    chamfer_9_piece_4b = extrude(amount=24.286731952, mode=Mode.PRIVATE)
    chamfer_9_piece_4b = split(chamfer_9_piece_4b, bisect_by=Plane(origin=(-37, -53, 3), z_dir=(0, 1, 0)), keep=Keep.TOP, mode=Mode.PRIVATE)
    chamfer_9_piece_4 = chamfer_9_piece_4a & chamfer_9_piece_4b
    add(chamfer_9_piece_4)

    # 倒角10
    chamfer_10_edges = [part.edges().sort_by_distance(p)[0] for p in [
        (-47, -68, 2),
        (-33, -68, 2),
    ]]
    chamfer(chamfer_10_edges, length=CHAMFER_10_SIZE)

    # 倒角11
    chamfer_11_edges = [part.edges().sort_by_distance(p)[0] for p in [
        (-43, -68, 2.5),
        (-37, -68, 2.5),
    ]]
    chamfer(chamfer_11_edges, length=CHAMFER_11_SIZE)

    # 草图29 → 凸台-拉伸22 (add)
    with BuildSketch(Plane(origin=(0, -53, 0), x_dir=(1, 0, 0), z_dir=(0, 1, 0))):
        with Locations((-40, -19)):
            Rectangle(SKETCH_29_W, SKETCH_29_H)
    extrude(amount=EXTRUDE_22_DEPTH)

    # 草图30 → 凸台-拉伸23 (add)
    with BuildSketch(Plane(origin=(0, 0, 5), x_dir=(-1, 0, 0), z_dir=(0, 0, -1))):
        with Locations((40, -43)):
            Rectangle(SKETCH_30_W, SKETCH_30_H)
    extrude(amount=EXTRUDE_23_DEPTH)

    # 草图31 → 切除-拉伸10 (cut)
    with BuildSketch(Plane.XZ.offset(53).offset(CUT_EXTRUDE_START)):
        with Locations(Location((-40, 8, 0), (0, 0, 90))):
            Circle(SKETCH_31_R)
    extrude(amount=CUT_EXTRUDE_10_DEPTH, mode=Mode.SUBTRACT)

    # 草图32 → 切除-拉伸11 (cut)
    with BuildSketch(Plane.XY.offset(3)):
        with Locations((-75, 15)):
            Circle(SKETCH_32_R)
        with Locations((-75, 5)):
            Circle(SKETCH_32_R)
        with Locations((-5, 5)):
            Circle(SKETCH_32_R)
        with Locations((-5, 15)):
            Circle(SKETCH_32_R)
    extrude(amount=-CUT_EXTRUDE_11_DEPTH, mode=Mode.SUBTRACT)

    # 草图33 → 切除-拉伸12 (cut)
    with BuildSketch(Plane(origin=(0, -33, 0), x_dir=(1, 0, 0), z_dir=(0, 1, 0))):
        with Locations((-40, -18)):
            Rectangle(SKETCH_33_W, SKETCH_33_H)
    extrude(amount=-CUT_EXTRUDE_12_DEPTH, mode=Mode.SUBTRACT)

    # 草图34 → 切除-拉伸13 (cut)
    with BuildSketch(Plane.XY.offset(9)):
        Polygon((-37, -82), (-33, -82), (-33, -70), (-32, -69), (-37, -69), (-43, -69), (-48, -69), (-47, -70), (-47, -82), (-43, -82), align=None)
    extrude(amount=-CUT_EXTRUDE_13_DEPTH, mode=Mode.SUBTRACT)

    # 草图36 → 凸台-拉伸24 (add)
    with BuildSketch(Plane(origin=(-43, 0, 0), x_dir=(0, 0, -1), z_dir=(1, 0, 0))):
        with BuildLine():
            Line((-3, -82.5), (0, -82.5))
            ThreePointArc((0, -82.5), (-1.5, -84), (-3, -82.5))
        make_face()
    extrude(amount=EXTRUDE_24_DEPTH)

    # 草图37 → 凸台-拉伸25 (add, up to next)
    with BuildSketch(Plane(origin=(0, -82.5, 0), x_dir=(1, 0, 0), z_dir=(0, 1, 0)), mode=Mode.PRIVATE) as extrude_25_sk1:
        with Locations((-42, -1.5)):
            Rectangle(SKETCH_37_W, SKETCH_37_H)
    extrude_25_tool1 = extrude(extrude_25_sk1.sketch, amount=EXTRUDE_25_REACH, mode=Mode.PRIVATE) - part.part
    add(extrude_25_tool1.solids().sort_by_distance((-42, -82.5, 1.5))[0])

    # 草图38 → 凸台-拉伸26 (add)
    with BuildSketch(Plane(origin=(-41, 0, 0), x_dir=(0, 0, -1), z_dir=(1, 0, 0))):
        with BuildLine():
            Line((-2, -82.5), (-1, -82.5))
            ThreePointArc((-1, -82.5), (-1.5, -83), (-2, -82.5))
        make_face()
    extrude(amount=EXTRUDE_26_DEPTH)

    # 草图39 → 凸台-拉伸27 (add)
    with BuildSketch(Plane(origin=(-39, 0, 0), x_dir=(0, 0, -1), z_dir=(1, 0, 0))):
        with BuildLine():
            Line((-3, -82.5), (0, -82.5))
            ThreePointArc((0, -82.5), (-1.5, -84), (-3, -82.5))
        make_face()
    extrude(amount=EXTRUDE_27_DEPTH)

    # 草图40 → 凸台-拉伸28 (add, up to next)
    with BuildSketch(Plane(origin=(0, -82.5, 0), x_dir=(1, 0, 0), z_dir=(0, 1, 0)), mode=Mode.PRIVATE) as extrude_28_sk1:
        Polygon((-41, -1), (-41, -2), (-39, -2), (-39, -3), (-37, -3), (-37, 0), (-39, 0), (-39, -1), align=None)
    extrude_28_tool1 = extrude(extrude_28_sk1.sketch, amount=EXTRUDE_28_REACH, mode=Mode.PRIVATE) - part.part
    add(extrude_28_tool1.solids().sort_by_distance((-38.5, -82.5, 1.5))[0])

    # 倒角12
    chamfer_12_edges = [part.edges().sort_by_distance(p)[0] for p in [
        (-40, -68, 0),
    ]]
    chamfer(chamfer_12_edges, length=CHAMFER_12_SIZE - 0.0001)  # a hair under: the kernel refuses the full size


solid = part.part
